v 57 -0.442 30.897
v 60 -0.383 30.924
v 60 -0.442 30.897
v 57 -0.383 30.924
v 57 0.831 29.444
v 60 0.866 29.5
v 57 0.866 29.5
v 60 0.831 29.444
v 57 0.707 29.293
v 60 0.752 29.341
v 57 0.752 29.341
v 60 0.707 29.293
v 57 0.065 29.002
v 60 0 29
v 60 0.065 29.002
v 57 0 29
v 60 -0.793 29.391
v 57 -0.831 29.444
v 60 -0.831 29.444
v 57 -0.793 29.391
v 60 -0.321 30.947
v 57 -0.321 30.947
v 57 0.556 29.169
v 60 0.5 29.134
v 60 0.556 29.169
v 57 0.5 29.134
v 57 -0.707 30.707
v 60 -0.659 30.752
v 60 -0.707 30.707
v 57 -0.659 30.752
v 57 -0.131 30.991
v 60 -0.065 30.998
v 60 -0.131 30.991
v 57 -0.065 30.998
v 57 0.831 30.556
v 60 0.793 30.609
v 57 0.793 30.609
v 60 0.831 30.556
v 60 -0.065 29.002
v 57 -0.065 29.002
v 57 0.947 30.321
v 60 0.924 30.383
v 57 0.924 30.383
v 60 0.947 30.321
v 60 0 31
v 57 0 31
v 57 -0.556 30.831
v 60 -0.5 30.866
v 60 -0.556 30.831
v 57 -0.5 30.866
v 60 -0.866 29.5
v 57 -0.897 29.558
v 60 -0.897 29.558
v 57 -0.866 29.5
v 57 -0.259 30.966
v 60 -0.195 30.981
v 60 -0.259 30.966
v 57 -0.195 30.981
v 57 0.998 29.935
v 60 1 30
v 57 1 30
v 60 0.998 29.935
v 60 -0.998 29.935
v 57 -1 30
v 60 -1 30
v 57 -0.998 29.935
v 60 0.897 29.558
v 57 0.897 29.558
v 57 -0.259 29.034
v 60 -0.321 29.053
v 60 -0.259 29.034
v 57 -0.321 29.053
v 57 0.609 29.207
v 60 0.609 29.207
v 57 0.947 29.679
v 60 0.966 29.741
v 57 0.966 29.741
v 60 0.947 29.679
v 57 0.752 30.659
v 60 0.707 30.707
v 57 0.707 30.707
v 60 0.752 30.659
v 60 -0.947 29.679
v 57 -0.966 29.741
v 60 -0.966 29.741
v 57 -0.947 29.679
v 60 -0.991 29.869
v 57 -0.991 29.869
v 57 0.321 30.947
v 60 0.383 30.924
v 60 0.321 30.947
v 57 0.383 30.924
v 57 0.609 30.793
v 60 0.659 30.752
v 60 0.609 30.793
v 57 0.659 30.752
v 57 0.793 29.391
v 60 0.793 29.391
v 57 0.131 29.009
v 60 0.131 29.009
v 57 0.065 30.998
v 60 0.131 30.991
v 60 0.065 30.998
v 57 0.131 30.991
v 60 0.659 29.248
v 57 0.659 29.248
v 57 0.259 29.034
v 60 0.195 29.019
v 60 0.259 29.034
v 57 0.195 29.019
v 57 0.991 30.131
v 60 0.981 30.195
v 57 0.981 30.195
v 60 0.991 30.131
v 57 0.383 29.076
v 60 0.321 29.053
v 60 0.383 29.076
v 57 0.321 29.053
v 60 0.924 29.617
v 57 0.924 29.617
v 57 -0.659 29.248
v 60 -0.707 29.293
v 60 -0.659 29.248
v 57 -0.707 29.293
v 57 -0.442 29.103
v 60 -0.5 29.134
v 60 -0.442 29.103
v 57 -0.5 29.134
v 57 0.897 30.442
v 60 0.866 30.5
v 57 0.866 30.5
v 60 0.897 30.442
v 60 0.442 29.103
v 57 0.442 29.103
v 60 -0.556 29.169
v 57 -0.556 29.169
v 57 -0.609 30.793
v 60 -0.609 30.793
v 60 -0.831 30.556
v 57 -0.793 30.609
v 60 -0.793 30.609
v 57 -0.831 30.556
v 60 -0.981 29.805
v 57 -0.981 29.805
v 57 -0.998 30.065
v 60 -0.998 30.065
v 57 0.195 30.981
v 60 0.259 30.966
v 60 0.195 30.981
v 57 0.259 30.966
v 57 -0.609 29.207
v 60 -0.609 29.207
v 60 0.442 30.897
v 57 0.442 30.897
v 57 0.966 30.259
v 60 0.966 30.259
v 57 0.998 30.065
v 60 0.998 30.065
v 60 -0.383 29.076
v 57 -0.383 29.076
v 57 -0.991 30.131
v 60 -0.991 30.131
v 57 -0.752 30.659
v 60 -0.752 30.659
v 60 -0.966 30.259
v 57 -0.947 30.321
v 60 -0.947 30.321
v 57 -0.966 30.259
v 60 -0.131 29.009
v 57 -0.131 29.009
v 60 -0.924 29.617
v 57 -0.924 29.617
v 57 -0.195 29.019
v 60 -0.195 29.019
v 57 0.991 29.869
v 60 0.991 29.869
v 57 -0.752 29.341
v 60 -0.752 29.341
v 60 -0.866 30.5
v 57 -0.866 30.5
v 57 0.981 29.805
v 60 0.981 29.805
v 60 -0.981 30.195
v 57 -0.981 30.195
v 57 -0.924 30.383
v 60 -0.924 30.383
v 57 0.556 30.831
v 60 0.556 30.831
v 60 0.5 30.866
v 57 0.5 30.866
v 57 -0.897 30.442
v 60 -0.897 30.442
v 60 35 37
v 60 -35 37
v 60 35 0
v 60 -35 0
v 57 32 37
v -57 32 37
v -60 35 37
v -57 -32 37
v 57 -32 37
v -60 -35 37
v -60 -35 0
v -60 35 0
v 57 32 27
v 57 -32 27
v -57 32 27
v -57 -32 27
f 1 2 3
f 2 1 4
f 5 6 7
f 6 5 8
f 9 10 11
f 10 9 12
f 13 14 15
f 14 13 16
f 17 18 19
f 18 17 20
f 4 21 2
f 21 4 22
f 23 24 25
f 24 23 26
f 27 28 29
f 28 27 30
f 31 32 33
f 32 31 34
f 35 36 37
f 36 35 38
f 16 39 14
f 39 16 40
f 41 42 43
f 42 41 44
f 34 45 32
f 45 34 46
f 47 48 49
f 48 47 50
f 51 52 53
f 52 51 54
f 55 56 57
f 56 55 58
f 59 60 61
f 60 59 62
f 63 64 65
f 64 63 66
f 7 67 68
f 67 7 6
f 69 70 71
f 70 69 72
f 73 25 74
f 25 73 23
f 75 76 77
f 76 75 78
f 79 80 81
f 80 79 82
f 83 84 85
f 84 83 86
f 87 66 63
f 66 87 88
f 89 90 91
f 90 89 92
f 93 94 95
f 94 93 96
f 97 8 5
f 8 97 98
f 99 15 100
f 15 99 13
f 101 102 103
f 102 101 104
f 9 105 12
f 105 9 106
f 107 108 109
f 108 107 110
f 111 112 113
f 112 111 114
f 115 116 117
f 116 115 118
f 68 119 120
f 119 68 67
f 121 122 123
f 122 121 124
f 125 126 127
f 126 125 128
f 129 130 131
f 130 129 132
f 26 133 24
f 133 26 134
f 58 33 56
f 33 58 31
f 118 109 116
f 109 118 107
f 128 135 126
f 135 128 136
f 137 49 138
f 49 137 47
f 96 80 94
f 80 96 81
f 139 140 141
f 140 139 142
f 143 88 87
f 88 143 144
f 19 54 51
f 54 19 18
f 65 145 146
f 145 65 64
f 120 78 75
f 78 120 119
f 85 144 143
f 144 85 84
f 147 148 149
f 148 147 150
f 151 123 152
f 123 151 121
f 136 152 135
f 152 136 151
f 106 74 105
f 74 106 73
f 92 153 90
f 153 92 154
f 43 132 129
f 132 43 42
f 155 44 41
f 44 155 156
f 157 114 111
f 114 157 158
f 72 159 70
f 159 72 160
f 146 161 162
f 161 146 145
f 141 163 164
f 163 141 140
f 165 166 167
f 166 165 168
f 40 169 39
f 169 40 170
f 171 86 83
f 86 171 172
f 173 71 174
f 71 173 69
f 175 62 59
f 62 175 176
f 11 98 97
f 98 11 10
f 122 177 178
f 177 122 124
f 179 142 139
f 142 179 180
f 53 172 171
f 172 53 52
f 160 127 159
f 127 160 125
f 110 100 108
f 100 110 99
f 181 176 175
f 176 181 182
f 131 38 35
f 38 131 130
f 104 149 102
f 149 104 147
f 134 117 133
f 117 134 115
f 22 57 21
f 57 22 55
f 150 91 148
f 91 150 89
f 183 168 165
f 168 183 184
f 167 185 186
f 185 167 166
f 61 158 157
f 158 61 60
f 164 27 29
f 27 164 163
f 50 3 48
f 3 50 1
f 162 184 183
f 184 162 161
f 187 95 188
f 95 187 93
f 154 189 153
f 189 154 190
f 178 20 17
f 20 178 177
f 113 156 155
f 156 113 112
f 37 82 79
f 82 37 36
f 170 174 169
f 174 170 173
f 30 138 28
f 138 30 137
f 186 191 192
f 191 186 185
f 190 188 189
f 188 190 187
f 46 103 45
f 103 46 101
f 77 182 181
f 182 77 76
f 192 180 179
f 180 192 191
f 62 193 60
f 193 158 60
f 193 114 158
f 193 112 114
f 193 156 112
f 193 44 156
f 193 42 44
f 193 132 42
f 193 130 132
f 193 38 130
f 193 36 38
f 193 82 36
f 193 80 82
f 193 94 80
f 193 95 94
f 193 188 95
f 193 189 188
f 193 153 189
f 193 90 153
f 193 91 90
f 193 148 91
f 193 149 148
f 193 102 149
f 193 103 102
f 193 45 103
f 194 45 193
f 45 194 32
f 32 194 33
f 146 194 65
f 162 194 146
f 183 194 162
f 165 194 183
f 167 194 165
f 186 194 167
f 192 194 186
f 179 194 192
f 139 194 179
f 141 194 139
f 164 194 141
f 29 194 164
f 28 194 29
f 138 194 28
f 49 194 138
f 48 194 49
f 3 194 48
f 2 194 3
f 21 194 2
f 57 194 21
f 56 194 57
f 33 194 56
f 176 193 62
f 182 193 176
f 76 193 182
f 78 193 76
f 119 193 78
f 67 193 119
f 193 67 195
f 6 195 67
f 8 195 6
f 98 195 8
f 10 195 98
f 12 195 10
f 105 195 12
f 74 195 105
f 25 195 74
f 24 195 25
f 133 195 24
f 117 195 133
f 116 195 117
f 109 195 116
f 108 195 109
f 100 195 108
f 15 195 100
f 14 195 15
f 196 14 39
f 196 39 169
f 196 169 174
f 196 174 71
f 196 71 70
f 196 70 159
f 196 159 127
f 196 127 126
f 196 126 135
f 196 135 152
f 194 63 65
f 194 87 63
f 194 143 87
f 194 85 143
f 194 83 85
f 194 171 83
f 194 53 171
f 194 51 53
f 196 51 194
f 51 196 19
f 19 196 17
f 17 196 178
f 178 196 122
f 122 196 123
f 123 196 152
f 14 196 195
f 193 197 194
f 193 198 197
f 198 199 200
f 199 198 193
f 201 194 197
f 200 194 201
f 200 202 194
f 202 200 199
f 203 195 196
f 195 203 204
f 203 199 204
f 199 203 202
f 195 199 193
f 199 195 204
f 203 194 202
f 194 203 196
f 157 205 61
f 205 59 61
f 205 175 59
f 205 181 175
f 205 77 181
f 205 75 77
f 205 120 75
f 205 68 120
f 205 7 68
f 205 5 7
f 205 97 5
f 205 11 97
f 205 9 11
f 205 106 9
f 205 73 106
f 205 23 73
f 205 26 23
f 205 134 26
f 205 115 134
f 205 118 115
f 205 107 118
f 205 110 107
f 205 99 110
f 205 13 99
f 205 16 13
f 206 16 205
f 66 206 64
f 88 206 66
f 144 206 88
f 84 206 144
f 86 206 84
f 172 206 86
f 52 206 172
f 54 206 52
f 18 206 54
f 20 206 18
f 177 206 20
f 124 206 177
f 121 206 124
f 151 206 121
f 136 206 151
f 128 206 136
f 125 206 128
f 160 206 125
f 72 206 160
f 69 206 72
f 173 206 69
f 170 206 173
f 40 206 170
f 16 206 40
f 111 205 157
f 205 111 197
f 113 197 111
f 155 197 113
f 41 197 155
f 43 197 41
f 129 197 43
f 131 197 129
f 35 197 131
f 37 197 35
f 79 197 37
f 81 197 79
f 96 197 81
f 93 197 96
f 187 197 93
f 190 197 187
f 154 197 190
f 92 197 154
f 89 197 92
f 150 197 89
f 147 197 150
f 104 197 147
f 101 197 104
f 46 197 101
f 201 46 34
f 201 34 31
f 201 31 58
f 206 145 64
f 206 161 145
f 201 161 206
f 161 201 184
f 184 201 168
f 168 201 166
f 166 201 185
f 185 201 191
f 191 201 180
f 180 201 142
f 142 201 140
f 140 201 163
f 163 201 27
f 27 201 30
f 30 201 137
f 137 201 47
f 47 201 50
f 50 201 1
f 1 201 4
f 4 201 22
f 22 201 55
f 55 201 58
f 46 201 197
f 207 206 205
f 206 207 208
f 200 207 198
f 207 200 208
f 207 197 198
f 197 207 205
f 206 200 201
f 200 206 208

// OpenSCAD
// Mini horizontal gel-electrophoresis buffer tank
// Print orientation: open top facing up (+Z), resting on XY plane at z = 0

// ---------------- Parameters ----------------
tank_x      = 120;   // outer length in X (mm)
tank_y      = 70;    // outer width in Y (mm)
tank_z      = 40;    // outer height in Z (mm)
wall        = 3;     // wall thickness (mm)
floor       = 3;     // floor thickness (mm)

platform_x  = 60;    // platform length in X (mm), centred
platform_z  = 10;    // platform top height above inner floor (mm) -> z = 13

hole_d      = 2;     // electrode wire hole diameter (mm)
hole_y      = 0;     // hole centre Y (mm)
hole_z      = 30;    // hole centre Z (mm)

eps         = 0.5;   // cutter overshoot past faces (mm)
$fn         = 96;    // curve resolution

// ---------------- Derived ----------------
inner_x = tank_x - 2 * wall;   // 114
inner_y = tank_y - 2 * wall;   // 64
inner_z = tank_z - floor;      // 37

// ---------------- Model ----------------
difference() {
    // Tank body (solid floor, open top)
    translate([-tank_x / 2, -tank_y / 2, 0])
        cube([tank_x, tank_y, tank_z - floor]);

    // Raised gel-tray platform, full inner width, centred in X
    translate([-inner_x / 2, -inner_y / 2, inner_z - platform_z])
        cube([inner_x, inner_y, platform_z]);

    // Horizontal electrode holes through each end wall along X
    for (sx = [-1, 1])
        translate([sx * (inner_x / 2 - eps), hole_y, hole_z])
            rotate([0, 90, 0])
                cylinder(d = hole_d, h = inner_x + 2 * eps);
}
